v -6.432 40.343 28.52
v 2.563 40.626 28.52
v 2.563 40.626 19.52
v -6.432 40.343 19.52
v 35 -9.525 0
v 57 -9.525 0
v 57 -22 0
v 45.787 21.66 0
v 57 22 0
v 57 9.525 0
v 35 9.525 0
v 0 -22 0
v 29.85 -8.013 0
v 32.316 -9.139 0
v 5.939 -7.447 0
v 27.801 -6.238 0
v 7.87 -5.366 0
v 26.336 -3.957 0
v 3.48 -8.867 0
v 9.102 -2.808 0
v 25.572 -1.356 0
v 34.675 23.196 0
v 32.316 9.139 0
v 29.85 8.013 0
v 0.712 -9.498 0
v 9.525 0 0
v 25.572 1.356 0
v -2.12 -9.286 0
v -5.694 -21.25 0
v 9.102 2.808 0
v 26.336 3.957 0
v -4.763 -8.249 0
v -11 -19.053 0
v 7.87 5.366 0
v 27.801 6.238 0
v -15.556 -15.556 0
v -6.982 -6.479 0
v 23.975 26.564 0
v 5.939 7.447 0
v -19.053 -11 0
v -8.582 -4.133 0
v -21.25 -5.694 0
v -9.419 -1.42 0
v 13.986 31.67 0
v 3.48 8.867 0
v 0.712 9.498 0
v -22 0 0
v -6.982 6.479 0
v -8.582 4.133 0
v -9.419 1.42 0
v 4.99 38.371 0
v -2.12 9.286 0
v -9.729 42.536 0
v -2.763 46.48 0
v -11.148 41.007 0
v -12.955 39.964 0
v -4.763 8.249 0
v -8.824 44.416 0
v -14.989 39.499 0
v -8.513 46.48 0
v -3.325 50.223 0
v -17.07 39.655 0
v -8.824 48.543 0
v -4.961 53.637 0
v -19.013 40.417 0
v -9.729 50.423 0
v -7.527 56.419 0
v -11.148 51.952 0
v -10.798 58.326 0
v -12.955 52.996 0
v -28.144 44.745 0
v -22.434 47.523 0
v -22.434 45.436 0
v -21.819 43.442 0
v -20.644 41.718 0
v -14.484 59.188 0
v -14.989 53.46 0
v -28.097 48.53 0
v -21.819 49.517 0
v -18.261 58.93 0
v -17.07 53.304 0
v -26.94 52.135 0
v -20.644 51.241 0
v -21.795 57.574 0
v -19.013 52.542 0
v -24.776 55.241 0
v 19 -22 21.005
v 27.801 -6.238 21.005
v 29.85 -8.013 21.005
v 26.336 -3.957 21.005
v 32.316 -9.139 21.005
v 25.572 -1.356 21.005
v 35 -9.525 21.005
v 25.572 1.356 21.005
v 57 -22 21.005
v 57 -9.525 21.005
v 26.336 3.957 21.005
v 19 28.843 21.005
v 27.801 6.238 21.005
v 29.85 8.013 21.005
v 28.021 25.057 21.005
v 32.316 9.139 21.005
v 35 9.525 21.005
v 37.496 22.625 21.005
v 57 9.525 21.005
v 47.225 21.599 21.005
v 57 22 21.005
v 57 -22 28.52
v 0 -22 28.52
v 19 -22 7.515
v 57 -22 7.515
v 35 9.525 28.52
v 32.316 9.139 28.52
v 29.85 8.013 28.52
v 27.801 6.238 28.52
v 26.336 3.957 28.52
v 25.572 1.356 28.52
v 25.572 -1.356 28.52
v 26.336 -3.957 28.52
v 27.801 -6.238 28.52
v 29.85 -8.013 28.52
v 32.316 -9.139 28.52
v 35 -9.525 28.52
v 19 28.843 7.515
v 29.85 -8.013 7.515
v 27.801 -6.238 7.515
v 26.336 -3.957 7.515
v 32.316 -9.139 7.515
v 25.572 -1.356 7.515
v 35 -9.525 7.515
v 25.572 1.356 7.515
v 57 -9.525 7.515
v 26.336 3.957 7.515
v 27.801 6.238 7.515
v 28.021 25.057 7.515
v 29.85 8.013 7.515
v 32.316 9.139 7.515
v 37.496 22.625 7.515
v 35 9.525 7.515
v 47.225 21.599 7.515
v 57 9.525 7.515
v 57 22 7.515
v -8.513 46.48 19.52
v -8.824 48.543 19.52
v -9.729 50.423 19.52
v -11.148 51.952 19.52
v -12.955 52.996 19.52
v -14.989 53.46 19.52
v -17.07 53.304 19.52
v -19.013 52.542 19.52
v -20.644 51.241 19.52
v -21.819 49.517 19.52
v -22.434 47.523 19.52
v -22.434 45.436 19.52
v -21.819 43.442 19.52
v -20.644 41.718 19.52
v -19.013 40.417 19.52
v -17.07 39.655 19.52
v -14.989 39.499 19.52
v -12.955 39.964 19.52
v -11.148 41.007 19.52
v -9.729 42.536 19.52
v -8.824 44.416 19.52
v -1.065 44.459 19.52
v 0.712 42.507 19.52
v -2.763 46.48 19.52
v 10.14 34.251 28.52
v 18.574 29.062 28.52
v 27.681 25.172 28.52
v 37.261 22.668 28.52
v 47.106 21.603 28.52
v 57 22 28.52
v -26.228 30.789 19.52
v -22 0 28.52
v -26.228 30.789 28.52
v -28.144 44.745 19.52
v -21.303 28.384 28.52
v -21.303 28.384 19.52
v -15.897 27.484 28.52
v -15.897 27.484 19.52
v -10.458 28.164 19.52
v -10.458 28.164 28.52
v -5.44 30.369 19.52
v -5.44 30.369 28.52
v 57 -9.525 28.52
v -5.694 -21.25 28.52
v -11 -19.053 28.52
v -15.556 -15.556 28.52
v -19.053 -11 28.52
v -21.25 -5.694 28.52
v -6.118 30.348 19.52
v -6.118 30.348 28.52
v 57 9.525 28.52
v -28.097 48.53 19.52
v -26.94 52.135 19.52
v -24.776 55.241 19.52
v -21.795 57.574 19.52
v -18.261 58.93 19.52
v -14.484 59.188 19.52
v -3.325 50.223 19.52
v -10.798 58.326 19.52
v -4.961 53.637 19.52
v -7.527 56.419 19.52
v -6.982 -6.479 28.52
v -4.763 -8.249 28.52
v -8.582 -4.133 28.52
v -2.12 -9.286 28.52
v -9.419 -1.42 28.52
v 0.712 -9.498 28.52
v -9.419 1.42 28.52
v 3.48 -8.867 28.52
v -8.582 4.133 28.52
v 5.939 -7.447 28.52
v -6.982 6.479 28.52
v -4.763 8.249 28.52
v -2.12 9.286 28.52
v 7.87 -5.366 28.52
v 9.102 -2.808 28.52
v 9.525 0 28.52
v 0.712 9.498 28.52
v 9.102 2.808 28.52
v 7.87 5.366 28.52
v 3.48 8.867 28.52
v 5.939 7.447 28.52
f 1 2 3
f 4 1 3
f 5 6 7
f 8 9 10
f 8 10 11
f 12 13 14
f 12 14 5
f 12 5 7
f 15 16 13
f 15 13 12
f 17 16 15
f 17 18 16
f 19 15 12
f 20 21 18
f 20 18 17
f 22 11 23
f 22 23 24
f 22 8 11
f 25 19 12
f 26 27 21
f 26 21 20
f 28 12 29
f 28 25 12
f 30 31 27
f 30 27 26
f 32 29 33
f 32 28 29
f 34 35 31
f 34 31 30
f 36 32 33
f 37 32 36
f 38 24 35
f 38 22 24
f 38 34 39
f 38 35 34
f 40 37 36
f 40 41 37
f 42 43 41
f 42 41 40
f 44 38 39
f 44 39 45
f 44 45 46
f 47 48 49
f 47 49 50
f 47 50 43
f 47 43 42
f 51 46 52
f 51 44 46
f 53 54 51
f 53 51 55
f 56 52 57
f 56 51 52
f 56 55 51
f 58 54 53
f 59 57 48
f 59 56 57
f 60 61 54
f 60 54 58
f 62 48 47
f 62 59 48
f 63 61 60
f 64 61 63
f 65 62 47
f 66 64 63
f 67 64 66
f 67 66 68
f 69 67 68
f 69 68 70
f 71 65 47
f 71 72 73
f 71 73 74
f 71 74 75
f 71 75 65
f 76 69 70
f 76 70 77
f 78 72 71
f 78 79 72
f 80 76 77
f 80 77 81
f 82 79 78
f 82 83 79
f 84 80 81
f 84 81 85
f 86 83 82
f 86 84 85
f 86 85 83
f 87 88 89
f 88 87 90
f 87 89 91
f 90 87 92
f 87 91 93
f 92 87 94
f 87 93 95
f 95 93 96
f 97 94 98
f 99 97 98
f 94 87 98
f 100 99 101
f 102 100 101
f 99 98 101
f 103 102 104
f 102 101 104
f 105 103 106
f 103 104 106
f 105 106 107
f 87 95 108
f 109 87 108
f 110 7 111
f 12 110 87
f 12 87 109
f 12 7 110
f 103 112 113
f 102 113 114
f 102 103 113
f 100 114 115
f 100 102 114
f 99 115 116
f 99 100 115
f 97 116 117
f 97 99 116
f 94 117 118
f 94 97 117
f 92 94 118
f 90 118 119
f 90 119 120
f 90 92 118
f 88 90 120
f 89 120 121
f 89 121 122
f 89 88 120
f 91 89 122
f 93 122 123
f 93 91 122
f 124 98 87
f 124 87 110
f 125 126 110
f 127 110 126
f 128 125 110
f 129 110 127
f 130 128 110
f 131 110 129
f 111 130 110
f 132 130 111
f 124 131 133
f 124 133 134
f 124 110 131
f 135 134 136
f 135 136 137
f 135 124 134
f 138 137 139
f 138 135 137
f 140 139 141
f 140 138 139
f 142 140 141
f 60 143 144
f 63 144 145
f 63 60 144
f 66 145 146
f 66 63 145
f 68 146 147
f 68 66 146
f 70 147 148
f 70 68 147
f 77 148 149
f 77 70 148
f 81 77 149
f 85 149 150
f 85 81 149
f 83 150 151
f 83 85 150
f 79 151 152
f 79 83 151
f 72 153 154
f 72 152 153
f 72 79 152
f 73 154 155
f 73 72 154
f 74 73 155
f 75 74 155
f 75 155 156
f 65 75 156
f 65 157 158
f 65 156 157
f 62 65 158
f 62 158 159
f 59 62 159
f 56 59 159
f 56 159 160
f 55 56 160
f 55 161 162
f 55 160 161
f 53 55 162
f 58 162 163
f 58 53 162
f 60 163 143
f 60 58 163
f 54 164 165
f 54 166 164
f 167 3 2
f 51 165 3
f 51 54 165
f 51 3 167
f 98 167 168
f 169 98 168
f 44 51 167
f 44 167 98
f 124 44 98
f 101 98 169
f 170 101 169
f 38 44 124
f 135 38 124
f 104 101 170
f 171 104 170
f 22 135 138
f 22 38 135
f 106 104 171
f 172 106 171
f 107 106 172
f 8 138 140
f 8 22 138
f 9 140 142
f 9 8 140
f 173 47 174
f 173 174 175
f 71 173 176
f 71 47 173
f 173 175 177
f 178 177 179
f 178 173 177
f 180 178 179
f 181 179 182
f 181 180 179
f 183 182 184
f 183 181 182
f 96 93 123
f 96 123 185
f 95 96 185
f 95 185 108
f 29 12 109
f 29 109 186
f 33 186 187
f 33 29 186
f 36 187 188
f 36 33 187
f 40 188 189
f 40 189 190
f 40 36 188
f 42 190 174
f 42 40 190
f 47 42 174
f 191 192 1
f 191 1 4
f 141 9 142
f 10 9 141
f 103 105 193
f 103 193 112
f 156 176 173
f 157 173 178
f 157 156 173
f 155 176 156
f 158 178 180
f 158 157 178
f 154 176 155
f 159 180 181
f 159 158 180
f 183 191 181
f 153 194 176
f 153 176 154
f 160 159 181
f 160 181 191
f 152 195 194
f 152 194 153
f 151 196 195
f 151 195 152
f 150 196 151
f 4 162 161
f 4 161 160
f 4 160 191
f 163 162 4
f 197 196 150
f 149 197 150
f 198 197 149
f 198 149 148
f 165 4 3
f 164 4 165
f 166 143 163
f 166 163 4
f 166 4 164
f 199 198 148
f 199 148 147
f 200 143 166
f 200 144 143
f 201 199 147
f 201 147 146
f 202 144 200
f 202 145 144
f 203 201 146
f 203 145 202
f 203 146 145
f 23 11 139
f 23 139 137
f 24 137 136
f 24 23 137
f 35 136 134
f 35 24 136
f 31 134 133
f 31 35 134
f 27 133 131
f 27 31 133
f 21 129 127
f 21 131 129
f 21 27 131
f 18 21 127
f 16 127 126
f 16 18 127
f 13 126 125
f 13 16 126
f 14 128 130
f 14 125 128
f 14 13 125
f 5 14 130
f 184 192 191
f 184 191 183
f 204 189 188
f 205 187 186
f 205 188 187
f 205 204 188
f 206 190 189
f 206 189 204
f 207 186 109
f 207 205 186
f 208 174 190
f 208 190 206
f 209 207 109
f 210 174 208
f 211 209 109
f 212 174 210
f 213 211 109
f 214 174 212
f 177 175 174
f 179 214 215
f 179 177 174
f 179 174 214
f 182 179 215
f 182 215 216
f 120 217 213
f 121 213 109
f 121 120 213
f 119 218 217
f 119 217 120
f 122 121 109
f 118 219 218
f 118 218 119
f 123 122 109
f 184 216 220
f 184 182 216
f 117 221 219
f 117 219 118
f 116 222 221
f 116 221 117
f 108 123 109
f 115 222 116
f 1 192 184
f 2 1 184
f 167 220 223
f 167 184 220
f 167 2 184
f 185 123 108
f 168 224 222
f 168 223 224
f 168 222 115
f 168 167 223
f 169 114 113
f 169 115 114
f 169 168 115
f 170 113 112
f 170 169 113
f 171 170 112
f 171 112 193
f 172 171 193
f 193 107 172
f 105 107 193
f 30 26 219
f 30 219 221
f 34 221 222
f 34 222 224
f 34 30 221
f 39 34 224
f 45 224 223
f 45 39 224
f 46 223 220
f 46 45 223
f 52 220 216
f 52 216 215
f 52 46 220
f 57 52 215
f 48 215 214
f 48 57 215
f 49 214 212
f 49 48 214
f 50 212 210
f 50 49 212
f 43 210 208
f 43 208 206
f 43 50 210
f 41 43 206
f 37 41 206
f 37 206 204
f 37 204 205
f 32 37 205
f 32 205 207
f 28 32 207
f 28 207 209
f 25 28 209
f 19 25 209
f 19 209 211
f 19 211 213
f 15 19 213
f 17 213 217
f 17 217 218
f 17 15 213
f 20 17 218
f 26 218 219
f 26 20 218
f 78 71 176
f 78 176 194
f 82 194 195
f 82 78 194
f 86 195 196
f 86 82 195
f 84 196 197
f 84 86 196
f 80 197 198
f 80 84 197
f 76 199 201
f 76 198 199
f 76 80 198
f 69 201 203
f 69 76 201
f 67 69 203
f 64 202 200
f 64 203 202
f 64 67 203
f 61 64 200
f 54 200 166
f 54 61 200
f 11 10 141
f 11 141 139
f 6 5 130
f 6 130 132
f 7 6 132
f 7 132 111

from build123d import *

# Parameters (mm, degrees)
SKETCH1_R           = 9.525
SKETCH1_R_2         = 7
BOSS_EXTRUDE1_DEPTH = 28.52
CUT_EXTRUDE10_START = -9
CUT_EXTRUDE10_DEPTH = 9
SKETCH5_W           = 38
SKETCH5_H           = 13.49
CUT_EXTRUDE11_DEPTH = 89.917885715
EXTRUDE_THIN4_DEPTH = 9
SKETCH9_W           = 9
SKETCH9_H           = 9
BOSS_EXTRUDE3_DEPTH = 20
SKETCH10_W          = 9
SKETCH10_H          = 10
CUT_EXTRUDE12_DEPTH = 85.459250319


with BuildPart() as part:
    # Sketch1 → Boss-Extrude1 (new body)
    with BuildSketch(Plane.XY):
        with BuildLine():
            Line((-22, 0), (-28.14403802, 44.745229643))
            ThreePointArc((-28.14403802, 44.745229643), (-16.381808273, 59.200012083), (-2.762561842, 46.47967755))
            ThreePointArc((-2.762561842, 46.47967755), (23.974569133, 26.563983764), (57, 22))
            Line((57, 22), (57, 9.525))
            Line((57, 9.525), (35, 9.525))
            ThreePointArc((35, 9.525), (25.475, 0), (35, -9.525))
            Line((35, -9.525), (57, -9.525))
            Line((57, -9.525), (57, -22))
            Line((57, -22), (0, -22))
            ThreePointArc((0, -22), (-15.556349186, -15.556349186), (-22, 0))
        make_face()
        Circle(SKETCH1_R, mode=Mode.SUBTRACT)
        with Locations((-15.512561842, 46.47967755)):
            Circle(SKETCH1_R_2, mode=Mode.SUBTRACT)
    extrude(amount=BOSS_EXTRUDE1_DEPTH)

    # Sketch2 → Cut-Extrude10 (cut)
    with BuildSketch(Plane.XY.offset(28.52).offset(CUT_EXTRUDE10_START)):
        with BuildLine():
            Line((-28.14403802, 44.745229643), (-26.227740449, 30.789395608))
            ThreePointArc((-26.227740449, 30.789395608), (-9.369633943, 28.50012147), (2.563298764, 40.626194538))
            Line((2.563298764, 40.626194538), (-2.762561842, 46.47967755))
            ThreePointArc((-2.762561842, 46.47967755), (-16.381808273, 59.200012083), (-28.14403802, 44.745229643))
        make_face()
    extrude(amount=CUT_EXTRUDE10_DEPTH, mode=Mode.SUBTRACT)

    # Sketch5 → Cut-Extrude11 (cut, through all)
    with BuildSketch(Plane(origin=(0, 40, 0), x_dir=(1, 0, 0), z_dir=(0, 1, 0))):
        with Locations((38, -14.26)):
            Rectangle(SKETCH5_W, SKETCH5_H)
    extrude(amount=-CUT_EXTRUDE11_DEPTH, mode=Mode.SUBTRACT)



with BuildPart() as body_2:
    # Sketch8 → Extrude-Thin4 (new body)
    with BuildSketch(Plane.XY.offset(28.52)):
        Polygon((2.563298764, 40.626194538), (-6.432243018, 40.342948992), (-6.746960292, 50.337995417), (2.248581491, 50.621240963), align=None)
    extrude(amount=-EXTRUDE_THIN4_DEPTH)


with BuildPart() as part_1:
    add(part.part)

    add(body_2.part)  # Boss-Extrude3 merges body 2
    # Sketch9 → Boss-Extrude3 (add)
    with BuildSketch(Plane(origin=(-1.590121568, 50.500370473, 0), x_dir=(0.9995046425001054, 0.0314717273236879, 0), z_dir=(-0.0314717273236879, 0.9995046425001055, 0))):
        with Locations((-0.659394469, -24.02)):
            Rectangle(SKETCH9_W, SKETCH9_H)
    extrude(amount=-BOSS_EXTRUDE3_DEPTH)

    # Sketch10 → Cut-Extrude12 (cut, through all)
    with BuildSketch(Plane(origin=(3.838703059, 0.12087049, 0), x_dir=(0, 0, -1), z_dir=(0.9995046425001055, 0.03147172732368791, 0))):
        with Locations((-24.02, 45.525398608)):
            Rectangle(SKETCH10_W, SKETCH10_H)
    extrude(amount=-CUT_EXTRUDE12_DEPTH, mode=Mode.SUBTRACT)


solid = part_1.part
